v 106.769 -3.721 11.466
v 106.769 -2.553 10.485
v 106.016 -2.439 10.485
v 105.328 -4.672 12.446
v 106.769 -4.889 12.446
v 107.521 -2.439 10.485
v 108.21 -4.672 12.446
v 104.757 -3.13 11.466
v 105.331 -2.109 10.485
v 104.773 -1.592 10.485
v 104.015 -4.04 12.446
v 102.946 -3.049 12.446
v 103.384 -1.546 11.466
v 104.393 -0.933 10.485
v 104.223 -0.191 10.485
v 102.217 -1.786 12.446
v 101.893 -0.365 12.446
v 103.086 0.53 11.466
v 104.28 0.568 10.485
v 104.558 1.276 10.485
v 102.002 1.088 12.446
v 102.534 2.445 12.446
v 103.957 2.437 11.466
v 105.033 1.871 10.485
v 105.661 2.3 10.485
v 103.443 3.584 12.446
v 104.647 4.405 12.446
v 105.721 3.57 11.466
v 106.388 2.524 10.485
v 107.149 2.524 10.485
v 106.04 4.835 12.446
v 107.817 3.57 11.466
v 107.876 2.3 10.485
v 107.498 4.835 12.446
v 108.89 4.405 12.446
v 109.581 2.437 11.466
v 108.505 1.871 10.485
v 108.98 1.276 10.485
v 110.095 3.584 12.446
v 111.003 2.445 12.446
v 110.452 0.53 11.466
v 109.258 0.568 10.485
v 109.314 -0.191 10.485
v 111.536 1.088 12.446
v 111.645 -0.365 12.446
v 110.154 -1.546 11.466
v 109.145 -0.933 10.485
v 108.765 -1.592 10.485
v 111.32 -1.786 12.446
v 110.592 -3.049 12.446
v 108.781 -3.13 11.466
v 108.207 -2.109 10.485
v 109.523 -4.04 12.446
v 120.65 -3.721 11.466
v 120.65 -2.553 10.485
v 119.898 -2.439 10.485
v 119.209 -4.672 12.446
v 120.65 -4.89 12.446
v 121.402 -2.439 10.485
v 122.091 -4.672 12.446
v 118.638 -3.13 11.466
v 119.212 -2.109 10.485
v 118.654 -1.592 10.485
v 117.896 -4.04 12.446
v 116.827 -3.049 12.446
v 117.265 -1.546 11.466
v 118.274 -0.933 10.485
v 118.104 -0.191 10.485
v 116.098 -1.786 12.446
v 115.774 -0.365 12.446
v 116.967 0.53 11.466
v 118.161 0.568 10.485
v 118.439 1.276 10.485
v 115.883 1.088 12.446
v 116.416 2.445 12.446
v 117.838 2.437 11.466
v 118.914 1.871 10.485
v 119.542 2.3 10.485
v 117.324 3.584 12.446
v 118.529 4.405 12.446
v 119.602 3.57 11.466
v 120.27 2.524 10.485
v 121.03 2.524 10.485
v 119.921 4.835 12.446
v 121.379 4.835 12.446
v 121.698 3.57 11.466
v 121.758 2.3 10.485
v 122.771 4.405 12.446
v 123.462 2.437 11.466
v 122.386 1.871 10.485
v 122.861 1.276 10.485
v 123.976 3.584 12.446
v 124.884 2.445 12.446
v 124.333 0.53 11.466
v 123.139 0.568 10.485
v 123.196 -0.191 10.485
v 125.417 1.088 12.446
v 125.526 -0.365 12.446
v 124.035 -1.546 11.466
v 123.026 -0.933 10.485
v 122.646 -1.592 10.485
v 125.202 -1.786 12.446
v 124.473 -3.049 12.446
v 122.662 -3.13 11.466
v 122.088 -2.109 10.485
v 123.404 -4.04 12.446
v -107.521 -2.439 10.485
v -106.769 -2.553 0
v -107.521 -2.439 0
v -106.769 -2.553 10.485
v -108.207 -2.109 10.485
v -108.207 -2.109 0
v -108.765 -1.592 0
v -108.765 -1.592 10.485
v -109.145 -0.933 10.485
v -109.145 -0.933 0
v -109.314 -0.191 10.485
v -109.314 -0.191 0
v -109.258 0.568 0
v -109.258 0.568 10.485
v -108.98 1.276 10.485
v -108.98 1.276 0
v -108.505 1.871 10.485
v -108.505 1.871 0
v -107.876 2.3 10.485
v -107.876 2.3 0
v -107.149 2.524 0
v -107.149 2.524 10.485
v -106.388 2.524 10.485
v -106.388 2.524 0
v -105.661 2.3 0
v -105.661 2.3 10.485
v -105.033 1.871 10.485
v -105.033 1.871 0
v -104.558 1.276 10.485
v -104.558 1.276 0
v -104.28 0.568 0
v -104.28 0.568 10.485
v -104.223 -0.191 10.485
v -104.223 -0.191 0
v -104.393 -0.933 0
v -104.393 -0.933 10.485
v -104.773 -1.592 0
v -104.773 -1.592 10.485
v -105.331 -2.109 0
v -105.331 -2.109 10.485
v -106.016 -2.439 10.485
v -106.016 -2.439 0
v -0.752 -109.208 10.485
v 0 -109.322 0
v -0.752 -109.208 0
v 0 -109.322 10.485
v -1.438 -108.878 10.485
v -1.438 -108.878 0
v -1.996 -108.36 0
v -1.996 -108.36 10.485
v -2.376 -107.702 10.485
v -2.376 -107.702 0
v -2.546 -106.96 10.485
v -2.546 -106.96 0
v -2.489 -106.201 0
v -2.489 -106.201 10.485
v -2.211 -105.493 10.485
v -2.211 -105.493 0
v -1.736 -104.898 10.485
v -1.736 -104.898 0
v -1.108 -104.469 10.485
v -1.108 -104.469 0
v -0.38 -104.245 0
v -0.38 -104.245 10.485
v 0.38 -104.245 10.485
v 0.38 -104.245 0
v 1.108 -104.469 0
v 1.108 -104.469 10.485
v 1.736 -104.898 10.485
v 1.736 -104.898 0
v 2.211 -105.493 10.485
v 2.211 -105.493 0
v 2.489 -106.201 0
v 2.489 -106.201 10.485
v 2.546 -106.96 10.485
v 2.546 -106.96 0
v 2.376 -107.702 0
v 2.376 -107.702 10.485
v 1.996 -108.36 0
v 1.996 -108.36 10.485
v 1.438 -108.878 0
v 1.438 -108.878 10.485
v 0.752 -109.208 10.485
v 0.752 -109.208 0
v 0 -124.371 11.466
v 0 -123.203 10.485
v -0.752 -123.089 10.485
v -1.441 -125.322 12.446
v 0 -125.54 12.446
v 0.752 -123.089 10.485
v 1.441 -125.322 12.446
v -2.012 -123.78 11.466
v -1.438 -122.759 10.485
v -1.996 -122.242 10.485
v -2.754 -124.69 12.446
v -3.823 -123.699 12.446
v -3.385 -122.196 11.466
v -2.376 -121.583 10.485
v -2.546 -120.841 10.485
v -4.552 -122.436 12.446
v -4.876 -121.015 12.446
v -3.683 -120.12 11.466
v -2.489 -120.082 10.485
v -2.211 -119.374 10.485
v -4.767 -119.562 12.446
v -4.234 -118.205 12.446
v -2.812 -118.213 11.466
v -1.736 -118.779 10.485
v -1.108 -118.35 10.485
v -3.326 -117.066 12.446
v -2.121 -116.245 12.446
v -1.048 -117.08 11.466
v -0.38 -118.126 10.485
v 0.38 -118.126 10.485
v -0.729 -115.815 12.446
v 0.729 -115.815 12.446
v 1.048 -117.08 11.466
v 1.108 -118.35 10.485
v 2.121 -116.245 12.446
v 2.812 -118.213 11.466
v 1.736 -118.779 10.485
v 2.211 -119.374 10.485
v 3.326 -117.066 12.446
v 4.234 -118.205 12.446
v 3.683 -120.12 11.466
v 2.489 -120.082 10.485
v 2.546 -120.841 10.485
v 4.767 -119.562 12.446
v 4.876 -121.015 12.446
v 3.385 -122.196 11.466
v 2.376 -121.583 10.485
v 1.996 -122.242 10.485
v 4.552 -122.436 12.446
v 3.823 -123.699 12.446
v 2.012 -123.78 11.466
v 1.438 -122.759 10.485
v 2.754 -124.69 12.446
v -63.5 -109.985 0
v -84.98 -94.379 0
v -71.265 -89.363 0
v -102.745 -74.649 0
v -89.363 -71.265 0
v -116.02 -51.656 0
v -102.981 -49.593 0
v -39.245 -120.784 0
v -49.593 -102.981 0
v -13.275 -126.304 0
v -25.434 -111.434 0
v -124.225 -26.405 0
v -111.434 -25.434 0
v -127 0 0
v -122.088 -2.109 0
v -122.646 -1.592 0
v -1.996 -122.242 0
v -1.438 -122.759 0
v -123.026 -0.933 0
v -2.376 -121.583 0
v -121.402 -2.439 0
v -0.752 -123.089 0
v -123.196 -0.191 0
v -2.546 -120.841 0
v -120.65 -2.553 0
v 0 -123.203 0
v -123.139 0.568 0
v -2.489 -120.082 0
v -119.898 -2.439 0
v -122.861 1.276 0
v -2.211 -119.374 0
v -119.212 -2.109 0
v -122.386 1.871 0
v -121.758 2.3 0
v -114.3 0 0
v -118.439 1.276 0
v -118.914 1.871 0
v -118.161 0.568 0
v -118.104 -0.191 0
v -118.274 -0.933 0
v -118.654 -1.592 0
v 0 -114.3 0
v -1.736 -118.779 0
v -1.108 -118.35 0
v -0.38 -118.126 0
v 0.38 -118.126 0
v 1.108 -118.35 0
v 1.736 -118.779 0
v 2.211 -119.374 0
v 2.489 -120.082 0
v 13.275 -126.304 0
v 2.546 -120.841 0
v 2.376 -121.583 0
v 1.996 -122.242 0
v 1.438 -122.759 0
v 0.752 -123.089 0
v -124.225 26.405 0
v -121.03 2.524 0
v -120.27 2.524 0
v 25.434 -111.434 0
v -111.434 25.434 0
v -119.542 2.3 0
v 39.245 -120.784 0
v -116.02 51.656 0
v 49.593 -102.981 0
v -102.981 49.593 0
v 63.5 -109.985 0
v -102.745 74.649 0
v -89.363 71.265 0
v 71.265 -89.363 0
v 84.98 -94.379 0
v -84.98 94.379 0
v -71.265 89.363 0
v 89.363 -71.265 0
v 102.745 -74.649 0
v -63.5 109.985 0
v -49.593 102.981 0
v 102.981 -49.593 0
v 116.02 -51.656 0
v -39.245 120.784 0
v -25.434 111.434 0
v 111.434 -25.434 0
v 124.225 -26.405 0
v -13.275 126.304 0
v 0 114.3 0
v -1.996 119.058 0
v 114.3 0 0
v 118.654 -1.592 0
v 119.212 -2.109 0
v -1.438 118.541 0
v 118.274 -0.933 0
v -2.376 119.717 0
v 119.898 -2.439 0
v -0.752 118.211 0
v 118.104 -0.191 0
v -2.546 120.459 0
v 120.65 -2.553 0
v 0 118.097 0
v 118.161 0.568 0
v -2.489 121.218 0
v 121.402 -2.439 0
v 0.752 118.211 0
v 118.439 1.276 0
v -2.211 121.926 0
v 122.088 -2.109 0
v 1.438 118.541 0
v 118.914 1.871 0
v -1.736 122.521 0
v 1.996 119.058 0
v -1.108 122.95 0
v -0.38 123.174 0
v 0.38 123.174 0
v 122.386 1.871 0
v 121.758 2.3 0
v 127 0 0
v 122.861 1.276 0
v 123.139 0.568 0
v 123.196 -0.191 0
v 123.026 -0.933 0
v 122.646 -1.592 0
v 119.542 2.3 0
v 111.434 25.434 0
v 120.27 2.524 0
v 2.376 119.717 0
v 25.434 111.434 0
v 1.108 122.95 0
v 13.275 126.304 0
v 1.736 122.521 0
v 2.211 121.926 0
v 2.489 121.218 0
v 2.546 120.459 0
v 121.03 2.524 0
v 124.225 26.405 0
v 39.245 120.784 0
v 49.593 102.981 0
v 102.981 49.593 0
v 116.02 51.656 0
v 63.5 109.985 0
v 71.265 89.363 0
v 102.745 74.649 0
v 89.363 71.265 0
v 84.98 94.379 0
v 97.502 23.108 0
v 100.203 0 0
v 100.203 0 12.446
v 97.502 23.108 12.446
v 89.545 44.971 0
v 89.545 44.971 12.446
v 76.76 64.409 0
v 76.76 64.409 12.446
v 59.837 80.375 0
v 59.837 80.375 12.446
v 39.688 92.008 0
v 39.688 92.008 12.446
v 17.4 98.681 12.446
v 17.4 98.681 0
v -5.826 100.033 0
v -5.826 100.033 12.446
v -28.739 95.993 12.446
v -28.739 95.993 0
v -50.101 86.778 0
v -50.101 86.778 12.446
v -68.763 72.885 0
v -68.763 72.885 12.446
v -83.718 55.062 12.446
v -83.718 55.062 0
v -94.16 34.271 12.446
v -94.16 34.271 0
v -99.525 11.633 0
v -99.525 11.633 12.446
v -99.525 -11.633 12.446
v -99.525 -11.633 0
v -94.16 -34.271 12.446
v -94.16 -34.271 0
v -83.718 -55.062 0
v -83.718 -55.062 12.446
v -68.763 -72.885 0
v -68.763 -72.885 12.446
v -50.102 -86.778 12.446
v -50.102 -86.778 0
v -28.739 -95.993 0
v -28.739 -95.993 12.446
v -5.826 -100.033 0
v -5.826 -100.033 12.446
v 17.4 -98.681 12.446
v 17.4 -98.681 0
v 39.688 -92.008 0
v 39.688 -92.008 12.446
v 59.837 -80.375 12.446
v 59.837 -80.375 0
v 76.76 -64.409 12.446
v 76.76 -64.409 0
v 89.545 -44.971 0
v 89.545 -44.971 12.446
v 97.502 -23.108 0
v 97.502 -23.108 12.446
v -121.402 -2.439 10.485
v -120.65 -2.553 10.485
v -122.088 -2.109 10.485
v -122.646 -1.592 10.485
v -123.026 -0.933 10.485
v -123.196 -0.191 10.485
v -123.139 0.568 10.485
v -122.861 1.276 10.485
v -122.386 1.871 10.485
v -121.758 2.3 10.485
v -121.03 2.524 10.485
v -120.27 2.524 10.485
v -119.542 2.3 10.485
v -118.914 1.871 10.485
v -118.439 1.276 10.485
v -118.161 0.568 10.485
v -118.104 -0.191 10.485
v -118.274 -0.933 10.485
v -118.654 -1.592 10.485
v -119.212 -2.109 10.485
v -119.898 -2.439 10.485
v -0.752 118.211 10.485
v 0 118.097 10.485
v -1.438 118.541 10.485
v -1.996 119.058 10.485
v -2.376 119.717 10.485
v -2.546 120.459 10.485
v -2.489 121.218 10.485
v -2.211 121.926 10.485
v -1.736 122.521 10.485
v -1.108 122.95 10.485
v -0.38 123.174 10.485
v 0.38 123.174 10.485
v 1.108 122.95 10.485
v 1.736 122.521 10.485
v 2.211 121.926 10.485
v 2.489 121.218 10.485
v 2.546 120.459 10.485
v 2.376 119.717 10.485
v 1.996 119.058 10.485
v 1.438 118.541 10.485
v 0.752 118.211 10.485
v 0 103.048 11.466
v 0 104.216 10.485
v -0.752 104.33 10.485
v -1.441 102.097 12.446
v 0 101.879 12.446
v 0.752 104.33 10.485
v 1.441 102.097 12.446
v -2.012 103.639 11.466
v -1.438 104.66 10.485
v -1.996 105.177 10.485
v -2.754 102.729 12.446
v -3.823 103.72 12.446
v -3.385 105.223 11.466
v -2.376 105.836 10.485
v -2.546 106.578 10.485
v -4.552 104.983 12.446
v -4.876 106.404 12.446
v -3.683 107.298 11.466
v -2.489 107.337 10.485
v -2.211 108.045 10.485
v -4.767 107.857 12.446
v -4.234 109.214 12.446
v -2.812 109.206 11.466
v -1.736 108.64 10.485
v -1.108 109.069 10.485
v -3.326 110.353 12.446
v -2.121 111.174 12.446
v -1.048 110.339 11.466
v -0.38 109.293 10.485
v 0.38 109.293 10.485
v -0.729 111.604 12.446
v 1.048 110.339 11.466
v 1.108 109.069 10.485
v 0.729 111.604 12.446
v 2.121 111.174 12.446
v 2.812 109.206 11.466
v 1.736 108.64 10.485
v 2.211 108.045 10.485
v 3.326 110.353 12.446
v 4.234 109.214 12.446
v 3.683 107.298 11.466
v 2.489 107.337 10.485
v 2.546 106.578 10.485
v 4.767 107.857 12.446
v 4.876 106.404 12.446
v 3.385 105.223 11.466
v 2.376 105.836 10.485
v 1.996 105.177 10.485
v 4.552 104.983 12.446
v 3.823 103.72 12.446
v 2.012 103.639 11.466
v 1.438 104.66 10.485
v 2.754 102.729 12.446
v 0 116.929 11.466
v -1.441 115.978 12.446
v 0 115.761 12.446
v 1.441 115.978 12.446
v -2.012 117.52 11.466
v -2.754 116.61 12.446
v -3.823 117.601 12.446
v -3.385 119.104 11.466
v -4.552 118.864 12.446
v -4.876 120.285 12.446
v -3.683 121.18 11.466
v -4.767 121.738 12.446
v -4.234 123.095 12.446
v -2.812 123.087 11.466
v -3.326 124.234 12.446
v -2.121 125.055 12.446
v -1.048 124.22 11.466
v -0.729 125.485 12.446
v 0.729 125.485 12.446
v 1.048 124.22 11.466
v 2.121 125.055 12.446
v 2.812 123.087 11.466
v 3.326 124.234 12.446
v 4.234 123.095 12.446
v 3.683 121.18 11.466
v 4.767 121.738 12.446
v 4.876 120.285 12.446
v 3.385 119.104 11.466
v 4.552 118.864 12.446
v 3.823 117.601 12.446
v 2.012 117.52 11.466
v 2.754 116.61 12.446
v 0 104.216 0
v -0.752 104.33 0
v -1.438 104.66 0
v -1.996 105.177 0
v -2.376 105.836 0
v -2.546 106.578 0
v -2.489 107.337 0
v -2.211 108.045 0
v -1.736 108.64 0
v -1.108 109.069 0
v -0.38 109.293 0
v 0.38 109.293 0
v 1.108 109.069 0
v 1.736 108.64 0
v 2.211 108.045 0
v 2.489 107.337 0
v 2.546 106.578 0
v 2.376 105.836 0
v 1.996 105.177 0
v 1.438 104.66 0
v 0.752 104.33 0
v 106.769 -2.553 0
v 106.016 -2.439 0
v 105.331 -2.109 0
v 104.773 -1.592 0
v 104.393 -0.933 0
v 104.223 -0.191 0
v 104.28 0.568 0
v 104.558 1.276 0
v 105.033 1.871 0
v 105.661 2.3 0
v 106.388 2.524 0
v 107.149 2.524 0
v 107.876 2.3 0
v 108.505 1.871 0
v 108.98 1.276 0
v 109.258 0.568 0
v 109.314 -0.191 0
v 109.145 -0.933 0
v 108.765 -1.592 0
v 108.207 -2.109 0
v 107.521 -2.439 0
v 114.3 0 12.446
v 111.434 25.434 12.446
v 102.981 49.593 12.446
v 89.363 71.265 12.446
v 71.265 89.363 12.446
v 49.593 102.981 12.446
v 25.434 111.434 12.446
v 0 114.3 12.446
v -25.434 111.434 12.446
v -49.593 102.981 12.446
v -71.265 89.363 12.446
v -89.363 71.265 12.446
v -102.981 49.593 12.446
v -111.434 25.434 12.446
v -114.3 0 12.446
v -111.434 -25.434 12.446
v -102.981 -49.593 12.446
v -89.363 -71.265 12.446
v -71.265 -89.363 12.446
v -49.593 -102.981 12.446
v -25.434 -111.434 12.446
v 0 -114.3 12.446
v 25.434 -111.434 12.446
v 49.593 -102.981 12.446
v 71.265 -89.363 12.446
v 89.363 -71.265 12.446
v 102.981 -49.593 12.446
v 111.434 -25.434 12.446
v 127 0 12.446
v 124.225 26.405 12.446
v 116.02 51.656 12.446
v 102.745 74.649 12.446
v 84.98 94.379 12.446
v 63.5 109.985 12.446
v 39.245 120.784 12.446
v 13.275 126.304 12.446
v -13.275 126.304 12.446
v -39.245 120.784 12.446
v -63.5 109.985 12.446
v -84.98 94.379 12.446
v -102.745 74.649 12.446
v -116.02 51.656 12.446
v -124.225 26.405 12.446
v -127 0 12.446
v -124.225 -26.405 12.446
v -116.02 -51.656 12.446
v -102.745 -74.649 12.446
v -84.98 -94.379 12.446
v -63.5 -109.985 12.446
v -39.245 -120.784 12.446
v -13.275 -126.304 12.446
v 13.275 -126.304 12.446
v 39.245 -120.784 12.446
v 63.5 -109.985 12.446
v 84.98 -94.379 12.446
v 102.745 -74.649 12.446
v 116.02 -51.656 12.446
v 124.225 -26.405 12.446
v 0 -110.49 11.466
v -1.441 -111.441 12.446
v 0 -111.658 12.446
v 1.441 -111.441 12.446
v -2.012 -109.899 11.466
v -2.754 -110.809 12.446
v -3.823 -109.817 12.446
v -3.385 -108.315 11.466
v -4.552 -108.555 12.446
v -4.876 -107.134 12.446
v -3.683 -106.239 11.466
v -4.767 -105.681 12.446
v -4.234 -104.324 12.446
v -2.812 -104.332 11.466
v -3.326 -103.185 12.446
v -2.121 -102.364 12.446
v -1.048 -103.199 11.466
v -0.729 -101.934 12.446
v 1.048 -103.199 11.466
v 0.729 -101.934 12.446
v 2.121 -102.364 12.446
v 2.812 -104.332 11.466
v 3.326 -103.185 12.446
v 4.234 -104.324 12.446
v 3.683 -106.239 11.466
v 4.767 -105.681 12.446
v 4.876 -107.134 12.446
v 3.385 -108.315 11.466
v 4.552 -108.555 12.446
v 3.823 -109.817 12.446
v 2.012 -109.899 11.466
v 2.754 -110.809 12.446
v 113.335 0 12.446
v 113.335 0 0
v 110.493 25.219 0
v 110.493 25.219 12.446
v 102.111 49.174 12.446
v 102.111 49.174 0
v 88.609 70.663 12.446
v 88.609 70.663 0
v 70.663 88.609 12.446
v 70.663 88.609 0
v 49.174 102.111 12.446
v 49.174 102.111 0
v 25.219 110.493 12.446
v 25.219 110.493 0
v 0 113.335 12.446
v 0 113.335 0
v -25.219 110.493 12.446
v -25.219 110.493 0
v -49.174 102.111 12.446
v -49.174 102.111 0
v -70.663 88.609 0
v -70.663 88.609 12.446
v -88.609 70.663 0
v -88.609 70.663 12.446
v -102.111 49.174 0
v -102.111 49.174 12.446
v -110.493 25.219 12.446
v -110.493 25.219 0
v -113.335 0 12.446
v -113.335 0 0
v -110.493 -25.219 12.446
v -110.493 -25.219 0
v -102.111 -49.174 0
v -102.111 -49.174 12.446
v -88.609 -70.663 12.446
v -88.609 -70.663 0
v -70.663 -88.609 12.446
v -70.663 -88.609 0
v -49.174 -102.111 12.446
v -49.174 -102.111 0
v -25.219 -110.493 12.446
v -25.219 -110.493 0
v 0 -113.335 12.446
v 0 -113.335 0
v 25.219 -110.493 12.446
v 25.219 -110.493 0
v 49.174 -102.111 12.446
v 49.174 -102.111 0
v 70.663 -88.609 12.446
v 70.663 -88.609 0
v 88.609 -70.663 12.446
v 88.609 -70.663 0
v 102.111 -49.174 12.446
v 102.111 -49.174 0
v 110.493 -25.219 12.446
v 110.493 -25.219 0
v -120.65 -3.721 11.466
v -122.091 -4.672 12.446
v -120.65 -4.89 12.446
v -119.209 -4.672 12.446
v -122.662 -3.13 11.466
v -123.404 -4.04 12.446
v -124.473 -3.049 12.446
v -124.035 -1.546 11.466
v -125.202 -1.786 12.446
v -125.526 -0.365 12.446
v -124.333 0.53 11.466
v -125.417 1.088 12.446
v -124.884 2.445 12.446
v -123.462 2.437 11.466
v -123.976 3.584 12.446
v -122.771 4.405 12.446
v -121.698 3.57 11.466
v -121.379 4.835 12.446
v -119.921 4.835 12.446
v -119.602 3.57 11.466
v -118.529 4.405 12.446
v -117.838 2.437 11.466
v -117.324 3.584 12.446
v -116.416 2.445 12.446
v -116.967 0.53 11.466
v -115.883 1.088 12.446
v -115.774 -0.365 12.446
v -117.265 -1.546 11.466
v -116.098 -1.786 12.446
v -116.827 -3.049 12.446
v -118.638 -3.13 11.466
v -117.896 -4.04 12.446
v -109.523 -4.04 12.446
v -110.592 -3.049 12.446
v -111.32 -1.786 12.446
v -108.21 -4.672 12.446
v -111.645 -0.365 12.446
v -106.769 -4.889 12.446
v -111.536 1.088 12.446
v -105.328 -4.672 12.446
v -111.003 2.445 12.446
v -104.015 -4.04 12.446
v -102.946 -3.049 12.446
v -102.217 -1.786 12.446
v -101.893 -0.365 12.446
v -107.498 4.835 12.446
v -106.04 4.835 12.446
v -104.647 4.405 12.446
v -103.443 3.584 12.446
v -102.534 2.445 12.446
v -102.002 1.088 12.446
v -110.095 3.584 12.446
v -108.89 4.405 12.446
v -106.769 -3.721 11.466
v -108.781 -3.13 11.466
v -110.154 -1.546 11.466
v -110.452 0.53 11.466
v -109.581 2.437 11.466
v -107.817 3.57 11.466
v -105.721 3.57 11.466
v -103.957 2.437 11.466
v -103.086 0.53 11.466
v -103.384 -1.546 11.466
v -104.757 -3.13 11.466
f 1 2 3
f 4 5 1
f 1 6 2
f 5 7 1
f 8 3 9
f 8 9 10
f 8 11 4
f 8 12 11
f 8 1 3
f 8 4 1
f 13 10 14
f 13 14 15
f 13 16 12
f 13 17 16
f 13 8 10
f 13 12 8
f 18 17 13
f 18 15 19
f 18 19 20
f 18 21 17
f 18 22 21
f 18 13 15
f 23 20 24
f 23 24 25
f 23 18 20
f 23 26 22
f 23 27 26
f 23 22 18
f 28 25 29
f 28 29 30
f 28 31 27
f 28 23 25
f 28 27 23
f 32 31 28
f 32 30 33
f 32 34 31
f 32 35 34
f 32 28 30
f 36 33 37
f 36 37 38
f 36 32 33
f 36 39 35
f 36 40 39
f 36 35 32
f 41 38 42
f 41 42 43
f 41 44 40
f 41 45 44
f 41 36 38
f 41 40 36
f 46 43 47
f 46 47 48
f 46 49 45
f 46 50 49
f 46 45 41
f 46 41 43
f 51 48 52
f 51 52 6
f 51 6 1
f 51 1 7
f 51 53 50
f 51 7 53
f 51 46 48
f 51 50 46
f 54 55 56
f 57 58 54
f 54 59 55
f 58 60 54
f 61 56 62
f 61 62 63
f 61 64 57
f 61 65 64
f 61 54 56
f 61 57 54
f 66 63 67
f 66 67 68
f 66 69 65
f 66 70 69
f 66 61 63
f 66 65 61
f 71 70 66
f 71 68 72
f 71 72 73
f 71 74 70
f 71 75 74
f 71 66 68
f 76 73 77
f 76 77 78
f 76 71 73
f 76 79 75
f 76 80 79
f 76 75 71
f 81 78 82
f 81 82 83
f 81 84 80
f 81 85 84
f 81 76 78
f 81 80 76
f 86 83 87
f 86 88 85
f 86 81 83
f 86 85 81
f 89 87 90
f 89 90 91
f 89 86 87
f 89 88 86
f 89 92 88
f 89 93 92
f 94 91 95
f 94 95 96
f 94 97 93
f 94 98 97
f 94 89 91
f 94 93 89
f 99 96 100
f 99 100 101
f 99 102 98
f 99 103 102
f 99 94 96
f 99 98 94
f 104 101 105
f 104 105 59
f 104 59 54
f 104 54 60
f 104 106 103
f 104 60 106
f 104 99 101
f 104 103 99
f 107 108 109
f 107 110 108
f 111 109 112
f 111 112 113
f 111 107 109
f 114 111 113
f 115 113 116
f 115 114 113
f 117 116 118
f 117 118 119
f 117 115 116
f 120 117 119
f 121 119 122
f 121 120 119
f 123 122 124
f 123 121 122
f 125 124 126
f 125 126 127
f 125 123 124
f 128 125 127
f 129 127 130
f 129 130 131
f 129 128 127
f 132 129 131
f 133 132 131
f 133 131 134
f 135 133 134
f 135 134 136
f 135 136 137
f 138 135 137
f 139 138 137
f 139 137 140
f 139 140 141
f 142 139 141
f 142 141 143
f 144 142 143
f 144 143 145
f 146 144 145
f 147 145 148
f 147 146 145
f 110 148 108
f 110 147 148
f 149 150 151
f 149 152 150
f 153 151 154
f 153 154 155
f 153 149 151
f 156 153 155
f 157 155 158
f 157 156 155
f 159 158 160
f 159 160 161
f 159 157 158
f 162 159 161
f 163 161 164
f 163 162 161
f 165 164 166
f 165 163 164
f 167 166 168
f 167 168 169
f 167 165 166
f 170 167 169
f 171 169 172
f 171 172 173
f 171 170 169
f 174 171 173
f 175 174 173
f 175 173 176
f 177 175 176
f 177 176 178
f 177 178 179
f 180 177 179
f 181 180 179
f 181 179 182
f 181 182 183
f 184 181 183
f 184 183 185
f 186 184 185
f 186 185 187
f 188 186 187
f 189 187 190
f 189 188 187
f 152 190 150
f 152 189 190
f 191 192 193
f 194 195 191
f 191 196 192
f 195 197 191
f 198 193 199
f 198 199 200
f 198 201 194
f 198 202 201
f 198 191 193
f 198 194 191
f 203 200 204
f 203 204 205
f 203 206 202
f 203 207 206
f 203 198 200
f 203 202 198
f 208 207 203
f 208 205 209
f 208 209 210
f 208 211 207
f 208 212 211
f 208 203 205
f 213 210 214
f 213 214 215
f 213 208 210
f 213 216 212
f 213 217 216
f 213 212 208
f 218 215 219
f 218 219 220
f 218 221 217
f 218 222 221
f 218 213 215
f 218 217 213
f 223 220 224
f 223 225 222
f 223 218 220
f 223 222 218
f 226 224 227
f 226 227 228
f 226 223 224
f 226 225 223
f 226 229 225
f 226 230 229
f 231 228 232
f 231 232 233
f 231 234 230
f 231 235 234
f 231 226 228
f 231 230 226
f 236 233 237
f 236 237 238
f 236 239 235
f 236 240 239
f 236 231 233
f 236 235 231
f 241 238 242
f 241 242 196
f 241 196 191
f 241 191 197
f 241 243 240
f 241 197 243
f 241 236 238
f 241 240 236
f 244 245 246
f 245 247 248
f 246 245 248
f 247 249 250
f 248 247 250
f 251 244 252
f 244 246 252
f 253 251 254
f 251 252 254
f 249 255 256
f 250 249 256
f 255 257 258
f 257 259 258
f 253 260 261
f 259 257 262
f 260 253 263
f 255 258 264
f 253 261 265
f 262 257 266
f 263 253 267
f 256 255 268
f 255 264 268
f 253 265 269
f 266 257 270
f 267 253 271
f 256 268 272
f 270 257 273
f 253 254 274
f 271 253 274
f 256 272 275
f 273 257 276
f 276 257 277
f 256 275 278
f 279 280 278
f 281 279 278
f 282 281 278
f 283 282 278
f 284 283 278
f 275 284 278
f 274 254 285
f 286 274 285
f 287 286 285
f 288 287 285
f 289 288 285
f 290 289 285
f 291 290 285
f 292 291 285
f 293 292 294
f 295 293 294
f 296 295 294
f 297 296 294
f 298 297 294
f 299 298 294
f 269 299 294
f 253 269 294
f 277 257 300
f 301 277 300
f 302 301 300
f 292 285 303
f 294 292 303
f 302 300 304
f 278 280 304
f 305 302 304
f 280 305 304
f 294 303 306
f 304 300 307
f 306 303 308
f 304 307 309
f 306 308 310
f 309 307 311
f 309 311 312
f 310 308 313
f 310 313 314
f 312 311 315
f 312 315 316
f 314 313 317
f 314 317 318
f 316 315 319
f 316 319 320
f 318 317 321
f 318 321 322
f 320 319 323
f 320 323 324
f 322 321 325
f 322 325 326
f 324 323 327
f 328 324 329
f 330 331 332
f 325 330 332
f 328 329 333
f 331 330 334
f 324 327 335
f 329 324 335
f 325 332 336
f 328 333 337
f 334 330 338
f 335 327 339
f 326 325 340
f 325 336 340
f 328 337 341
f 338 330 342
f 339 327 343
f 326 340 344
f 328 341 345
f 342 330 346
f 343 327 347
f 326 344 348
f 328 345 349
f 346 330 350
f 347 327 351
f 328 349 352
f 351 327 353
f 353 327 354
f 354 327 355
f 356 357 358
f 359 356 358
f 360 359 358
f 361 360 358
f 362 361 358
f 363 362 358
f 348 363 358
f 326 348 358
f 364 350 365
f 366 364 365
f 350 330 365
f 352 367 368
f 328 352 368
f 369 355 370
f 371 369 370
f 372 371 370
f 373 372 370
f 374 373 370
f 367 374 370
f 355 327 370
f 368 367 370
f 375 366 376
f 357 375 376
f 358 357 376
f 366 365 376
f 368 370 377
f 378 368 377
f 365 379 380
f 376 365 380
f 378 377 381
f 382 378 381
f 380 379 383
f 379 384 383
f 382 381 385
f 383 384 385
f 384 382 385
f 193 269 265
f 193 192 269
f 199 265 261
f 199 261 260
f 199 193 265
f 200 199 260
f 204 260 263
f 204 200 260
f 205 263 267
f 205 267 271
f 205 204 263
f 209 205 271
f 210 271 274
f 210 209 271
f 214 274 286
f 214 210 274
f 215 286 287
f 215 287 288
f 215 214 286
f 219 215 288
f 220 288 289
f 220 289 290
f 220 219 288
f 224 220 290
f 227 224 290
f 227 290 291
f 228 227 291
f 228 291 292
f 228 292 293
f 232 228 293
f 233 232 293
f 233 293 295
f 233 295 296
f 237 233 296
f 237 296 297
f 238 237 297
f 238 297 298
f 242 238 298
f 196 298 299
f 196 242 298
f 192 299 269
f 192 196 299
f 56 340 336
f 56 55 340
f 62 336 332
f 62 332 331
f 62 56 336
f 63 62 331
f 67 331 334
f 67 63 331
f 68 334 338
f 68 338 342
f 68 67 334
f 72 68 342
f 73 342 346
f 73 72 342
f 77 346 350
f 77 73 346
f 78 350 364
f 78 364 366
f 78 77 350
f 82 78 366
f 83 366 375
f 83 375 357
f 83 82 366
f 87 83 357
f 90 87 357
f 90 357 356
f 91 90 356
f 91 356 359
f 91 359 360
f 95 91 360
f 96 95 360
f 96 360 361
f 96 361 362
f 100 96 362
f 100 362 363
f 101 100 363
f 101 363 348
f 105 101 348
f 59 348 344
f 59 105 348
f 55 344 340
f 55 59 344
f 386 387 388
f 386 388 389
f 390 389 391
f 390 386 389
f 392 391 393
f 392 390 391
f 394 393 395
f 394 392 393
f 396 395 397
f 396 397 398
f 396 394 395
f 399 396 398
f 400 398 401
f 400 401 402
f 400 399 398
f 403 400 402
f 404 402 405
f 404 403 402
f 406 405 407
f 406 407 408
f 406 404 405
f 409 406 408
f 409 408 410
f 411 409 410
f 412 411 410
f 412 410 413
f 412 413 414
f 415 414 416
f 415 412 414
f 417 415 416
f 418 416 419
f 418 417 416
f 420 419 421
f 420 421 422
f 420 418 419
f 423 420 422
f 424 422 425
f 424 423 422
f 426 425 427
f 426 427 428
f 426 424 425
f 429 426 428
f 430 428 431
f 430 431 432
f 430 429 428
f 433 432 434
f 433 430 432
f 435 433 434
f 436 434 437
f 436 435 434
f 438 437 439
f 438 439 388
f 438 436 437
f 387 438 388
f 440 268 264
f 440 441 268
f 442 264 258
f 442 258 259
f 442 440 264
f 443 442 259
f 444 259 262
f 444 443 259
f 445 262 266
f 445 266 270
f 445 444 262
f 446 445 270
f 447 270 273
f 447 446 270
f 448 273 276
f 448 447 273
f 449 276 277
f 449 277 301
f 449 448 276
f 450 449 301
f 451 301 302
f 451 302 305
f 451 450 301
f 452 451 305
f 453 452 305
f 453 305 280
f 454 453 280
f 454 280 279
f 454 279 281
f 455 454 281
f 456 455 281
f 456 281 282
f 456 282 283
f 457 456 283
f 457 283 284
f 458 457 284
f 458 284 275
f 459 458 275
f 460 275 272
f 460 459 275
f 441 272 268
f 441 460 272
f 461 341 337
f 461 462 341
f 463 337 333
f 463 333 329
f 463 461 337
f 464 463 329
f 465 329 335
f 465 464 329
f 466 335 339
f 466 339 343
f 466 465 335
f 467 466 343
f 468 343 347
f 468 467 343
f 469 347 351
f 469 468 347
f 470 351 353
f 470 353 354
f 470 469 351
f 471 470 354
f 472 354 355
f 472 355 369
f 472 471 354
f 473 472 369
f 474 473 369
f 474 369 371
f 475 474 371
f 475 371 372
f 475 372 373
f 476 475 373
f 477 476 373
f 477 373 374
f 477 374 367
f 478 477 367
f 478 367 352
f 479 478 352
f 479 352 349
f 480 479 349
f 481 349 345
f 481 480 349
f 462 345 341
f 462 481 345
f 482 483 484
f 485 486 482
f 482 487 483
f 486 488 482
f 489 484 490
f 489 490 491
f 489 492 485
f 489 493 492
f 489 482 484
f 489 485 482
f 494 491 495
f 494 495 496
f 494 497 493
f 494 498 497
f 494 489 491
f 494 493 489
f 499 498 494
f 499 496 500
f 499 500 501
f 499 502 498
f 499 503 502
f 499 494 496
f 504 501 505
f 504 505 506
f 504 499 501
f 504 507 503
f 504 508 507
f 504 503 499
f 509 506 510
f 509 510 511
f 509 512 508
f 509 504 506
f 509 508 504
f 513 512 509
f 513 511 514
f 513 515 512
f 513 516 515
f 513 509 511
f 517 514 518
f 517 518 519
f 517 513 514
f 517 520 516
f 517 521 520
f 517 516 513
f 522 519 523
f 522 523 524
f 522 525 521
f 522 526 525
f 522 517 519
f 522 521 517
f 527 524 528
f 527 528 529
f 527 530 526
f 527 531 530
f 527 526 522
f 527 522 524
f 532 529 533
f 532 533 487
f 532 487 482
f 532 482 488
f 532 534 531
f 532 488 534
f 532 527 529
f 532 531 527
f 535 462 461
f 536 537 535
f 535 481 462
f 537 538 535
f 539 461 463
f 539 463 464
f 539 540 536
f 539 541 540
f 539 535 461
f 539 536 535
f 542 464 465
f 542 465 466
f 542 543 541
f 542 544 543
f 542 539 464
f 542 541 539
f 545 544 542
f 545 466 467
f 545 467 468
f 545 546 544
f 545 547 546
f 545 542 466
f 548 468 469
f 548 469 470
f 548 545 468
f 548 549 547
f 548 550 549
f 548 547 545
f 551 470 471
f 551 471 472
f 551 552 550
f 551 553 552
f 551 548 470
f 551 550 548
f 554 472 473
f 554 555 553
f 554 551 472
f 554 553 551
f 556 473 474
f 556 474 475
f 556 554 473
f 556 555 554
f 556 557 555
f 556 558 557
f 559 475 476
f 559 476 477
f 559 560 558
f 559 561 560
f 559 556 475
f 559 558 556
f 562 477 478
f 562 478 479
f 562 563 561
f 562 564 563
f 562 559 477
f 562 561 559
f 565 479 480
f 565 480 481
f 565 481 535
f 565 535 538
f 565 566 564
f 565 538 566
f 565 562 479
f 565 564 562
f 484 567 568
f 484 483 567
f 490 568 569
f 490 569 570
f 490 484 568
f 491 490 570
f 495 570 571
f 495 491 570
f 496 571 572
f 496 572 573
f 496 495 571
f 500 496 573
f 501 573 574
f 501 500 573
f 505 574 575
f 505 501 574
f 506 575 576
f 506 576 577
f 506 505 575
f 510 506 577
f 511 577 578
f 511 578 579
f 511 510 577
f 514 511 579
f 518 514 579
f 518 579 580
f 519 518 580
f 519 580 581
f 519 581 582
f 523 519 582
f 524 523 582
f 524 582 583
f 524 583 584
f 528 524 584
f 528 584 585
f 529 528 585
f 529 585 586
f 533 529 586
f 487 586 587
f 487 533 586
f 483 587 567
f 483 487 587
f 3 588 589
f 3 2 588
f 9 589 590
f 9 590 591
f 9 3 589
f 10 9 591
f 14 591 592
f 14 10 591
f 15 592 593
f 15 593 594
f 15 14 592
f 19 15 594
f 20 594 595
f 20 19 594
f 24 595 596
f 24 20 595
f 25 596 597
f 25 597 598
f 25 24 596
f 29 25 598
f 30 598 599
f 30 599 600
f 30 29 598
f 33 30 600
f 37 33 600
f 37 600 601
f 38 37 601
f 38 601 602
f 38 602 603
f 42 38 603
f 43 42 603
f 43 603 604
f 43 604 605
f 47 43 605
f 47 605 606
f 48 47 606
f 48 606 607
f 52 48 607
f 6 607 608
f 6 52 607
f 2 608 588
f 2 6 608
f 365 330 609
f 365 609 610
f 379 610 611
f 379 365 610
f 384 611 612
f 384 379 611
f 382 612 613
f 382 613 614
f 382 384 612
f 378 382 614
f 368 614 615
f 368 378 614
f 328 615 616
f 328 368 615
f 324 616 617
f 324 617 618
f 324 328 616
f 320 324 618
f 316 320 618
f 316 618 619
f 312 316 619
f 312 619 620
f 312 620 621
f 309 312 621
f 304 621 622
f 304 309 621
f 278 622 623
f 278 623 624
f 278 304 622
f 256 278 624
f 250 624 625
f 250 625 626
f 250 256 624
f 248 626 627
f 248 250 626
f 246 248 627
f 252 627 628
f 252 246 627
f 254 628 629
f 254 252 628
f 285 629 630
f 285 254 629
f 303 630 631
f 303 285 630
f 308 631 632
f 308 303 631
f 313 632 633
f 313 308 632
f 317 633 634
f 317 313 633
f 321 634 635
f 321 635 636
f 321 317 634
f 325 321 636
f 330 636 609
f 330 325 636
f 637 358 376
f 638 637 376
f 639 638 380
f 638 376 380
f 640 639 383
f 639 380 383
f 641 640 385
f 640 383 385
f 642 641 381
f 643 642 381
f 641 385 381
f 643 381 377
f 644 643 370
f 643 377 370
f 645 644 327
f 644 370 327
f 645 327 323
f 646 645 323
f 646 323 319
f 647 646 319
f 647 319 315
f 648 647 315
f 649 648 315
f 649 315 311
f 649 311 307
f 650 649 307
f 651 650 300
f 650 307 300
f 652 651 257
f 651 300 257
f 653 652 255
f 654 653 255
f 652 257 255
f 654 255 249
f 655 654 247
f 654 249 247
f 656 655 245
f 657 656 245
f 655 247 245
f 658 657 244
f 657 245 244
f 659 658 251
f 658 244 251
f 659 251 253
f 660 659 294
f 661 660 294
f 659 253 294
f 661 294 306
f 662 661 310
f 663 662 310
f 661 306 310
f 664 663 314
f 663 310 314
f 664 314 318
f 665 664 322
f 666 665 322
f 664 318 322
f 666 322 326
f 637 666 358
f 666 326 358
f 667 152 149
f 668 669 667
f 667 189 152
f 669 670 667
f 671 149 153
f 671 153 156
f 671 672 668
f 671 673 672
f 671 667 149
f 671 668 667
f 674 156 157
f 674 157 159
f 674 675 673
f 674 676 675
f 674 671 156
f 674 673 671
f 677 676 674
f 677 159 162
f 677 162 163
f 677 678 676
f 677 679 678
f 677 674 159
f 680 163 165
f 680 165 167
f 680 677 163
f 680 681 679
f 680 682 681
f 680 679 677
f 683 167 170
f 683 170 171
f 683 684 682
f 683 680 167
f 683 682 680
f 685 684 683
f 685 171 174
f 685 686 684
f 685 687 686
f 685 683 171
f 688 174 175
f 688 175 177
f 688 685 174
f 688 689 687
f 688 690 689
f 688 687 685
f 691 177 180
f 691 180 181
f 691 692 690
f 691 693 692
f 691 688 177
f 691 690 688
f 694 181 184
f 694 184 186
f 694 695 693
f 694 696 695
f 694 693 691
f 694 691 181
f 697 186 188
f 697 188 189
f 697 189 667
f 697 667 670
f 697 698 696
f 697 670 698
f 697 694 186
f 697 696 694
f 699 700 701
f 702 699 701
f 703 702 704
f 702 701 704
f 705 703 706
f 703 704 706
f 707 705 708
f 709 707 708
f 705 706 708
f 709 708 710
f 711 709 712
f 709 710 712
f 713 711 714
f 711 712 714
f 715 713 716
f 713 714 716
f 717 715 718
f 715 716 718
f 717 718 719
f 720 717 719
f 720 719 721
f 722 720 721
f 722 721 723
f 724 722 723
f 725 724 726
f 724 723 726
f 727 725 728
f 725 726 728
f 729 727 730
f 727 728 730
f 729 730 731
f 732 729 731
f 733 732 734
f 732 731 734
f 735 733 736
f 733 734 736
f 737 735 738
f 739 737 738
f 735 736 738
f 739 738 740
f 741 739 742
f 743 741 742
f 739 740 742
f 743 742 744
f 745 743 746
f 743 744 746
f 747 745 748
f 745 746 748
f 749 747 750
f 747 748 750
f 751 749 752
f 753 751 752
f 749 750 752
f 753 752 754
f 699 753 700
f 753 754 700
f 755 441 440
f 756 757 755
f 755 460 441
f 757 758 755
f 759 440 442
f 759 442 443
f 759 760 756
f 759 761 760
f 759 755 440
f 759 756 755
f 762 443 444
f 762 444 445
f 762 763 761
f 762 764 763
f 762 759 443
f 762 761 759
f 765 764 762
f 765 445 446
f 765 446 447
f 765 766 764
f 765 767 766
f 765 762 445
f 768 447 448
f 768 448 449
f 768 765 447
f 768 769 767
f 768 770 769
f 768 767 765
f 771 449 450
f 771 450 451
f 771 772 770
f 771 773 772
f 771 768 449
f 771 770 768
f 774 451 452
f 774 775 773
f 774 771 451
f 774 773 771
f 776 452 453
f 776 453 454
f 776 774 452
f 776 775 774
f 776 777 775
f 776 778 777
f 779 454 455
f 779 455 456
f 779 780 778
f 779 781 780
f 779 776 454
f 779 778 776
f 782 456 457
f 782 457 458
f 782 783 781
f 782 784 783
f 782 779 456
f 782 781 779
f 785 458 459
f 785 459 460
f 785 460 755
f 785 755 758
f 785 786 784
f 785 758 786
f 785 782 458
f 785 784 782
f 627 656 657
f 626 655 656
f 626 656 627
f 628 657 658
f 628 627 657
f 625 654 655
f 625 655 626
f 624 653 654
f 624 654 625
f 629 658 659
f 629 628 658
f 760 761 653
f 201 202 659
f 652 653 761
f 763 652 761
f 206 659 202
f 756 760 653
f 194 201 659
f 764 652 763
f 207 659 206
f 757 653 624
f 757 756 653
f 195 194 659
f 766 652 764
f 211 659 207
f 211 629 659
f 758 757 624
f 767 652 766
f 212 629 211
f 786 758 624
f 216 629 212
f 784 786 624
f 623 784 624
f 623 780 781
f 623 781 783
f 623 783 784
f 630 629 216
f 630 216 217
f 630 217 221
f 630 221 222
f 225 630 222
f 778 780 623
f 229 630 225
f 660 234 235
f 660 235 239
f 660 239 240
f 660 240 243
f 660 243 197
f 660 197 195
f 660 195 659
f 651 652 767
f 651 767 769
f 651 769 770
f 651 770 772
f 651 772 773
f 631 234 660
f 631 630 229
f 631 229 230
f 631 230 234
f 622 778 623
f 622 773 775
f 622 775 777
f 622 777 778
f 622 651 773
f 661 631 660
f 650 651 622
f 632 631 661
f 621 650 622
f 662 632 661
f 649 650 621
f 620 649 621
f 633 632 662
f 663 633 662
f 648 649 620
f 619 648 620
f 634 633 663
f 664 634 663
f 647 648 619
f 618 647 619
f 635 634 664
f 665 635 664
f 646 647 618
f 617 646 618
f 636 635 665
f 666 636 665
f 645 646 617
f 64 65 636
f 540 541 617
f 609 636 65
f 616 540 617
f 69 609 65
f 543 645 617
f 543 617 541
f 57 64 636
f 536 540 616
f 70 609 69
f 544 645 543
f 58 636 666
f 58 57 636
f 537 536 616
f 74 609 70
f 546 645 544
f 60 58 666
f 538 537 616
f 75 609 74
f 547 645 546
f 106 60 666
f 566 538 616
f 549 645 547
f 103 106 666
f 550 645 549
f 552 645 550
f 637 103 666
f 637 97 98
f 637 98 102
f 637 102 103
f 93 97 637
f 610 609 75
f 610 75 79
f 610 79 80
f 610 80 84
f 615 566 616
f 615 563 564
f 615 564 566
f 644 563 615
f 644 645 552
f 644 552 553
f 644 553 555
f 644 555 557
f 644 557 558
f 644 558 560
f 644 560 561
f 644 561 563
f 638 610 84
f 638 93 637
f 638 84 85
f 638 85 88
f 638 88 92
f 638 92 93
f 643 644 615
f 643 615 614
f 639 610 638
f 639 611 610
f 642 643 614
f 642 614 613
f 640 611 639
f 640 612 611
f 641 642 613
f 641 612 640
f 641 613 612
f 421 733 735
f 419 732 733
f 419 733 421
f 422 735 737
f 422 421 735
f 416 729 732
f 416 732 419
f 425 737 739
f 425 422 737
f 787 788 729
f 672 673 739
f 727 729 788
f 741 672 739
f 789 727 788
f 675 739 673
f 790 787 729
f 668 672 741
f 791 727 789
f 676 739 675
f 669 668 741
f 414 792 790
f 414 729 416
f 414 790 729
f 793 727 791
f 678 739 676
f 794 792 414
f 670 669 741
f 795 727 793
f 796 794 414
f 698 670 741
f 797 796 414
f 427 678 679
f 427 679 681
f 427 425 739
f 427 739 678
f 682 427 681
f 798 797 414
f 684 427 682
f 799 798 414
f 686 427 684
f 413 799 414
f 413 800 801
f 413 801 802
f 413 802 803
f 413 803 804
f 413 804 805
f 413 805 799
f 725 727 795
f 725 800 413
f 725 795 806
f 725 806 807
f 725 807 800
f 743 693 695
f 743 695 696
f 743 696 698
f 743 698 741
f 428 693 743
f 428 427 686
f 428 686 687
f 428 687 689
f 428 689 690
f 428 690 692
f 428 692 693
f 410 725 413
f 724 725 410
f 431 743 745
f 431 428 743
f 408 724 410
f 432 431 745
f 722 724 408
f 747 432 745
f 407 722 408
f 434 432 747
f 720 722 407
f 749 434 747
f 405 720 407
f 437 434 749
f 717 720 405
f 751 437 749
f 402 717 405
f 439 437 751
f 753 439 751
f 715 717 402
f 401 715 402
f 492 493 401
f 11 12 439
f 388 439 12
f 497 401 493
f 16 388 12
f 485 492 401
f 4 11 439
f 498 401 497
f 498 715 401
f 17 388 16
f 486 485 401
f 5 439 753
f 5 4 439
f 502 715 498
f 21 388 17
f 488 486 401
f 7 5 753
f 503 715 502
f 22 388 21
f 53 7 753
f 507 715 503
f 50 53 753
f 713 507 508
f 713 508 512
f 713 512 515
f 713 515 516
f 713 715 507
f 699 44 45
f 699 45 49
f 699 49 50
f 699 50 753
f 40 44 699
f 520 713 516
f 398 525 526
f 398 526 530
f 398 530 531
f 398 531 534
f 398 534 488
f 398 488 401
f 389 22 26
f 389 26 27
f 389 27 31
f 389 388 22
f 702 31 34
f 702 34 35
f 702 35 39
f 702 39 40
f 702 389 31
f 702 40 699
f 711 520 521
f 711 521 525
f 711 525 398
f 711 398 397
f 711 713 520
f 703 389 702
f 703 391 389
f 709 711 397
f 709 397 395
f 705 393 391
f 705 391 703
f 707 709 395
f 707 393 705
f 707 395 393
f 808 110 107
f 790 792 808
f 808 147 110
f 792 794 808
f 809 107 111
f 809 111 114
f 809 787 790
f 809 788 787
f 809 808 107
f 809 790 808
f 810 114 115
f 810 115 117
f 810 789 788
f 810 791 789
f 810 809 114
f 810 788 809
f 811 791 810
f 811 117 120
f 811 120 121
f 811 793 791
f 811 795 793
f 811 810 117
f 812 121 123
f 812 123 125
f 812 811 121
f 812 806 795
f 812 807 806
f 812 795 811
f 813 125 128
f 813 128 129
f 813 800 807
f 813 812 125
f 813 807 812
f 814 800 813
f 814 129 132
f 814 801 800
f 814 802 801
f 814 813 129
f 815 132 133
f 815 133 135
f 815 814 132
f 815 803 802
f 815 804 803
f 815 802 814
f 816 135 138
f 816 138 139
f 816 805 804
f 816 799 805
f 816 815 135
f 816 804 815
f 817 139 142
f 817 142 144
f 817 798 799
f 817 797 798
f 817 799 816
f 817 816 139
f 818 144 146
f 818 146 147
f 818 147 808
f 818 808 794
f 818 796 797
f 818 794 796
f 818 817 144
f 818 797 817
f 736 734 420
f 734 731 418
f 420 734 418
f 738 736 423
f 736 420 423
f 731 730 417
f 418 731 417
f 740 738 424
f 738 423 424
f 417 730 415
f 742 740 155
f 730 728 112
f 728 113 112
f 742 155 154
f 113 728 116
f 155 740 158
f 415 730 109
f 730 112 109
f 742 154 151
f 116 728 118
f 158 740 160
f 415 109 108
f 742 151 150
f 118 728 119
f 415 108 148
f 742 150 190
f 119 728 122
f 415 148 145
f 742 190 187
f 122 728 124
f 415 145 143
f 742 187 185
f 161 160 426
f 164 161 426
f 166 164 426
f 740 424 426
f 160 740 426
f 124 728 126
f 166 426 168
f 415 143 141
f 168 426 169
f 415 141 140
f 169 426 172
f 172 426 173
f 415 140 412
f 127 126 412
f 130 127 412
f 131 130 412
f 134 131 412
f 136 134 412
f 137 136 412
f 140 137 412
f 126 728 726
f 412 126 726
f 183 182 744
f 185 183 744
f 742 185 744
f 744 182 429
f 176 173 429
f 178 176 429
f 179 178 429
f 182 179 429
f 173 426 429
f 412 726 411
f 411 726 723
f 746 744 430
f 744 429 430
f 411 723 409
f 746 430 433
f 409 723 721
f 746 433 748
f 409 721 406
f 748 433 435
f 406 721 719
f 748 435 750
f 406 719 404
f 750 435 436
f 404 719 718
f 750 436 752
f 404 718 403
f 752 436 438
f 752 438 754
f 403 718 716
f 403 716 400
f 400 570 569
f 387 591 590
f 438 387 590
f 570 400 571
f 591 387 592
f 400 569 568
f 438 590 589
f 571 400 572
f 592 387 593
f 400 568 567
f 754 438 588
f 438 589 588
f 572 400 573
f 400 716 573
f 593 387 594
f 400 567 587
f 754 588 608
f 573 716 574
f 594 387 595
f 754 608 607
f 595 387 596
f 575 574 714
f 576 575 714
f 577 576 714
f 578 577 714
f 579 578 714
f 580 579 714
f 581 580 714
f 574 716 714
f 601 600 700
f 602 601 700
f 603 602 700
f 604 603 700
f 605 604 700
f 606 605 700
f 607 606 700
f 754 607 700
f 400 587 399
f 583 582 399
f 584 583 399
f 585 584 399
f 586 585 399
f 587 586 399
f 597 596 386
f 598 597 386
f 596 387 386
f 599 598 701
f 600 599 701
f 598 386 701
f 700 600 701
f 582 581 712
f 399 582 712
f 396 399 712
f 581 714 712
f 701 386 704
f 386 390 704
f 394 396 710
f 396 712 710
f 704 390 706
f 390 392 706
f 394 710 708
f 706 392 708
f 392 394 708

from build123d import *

# Parameters (mm, degrees)
SKETCH1_R                                     = 113.3348
SKETCH1_R_2                                   = 100.203
BOSS_EXTRUDE1_DEPTH                           = 12.446
SKETCH1_R_3                                   = 127
SKETCH1_R_4                                   = 114.3
BOSS_EXTRUDE1_2_DEPTH                         = 12.446
CSK_FOR_10_FLAT_HEAD_MACHINE_SCREW_2_COUNT    = 2
CSK_FOR_10_FLAT_HEAD_MACHINE_SCREW_2_PITCH    = 170.6248663
CSK_FOR_10_FLAT_HEAD_MACHINE_SCREW_3_COUNT    = 2
CSK_FOR_10_FLAT_HEAD_MACHINE_SCREW_3_PITCH    = 241.3
CSK_FOR_10_FLAT_HEAD_MACHINE_SCREW_4_COUNT    = 2
CSK_FOR_10_FLAT_HEAD_MACHINE_SCREW_4_PITCH    = 170.6248663
CSK_FOR_10_FLAT_HEAD_MACHINE_SCREW_5_AT_COUNT = 2
CSK_FOR_10_FLAT_HEAD_MACHINE_SCREW_5_AT_PITCH = 150.99402642
CSK_FOR_10_FLAT_HEAD_MACHINE_SCREW_6_COUNT    = 2
CSK_FOR_10_FLAT_HEAD_MACHINE_SCREW_6_PITCH    = 213.5378
CSK_FOR_10_FLAT_HEAD_MACHINE_SCREW_7_COUNT    = 2
CSK_FOR_10_FLAT_HEAD_MACHINE_SCREW_7_PITCH    = 150.99402642


with BuildPart() as part:
    # Sketch1 → Boss-Extrude1 (new body)
    with BuildSketch(Plane.XY):
        Circle(SKETCH1_R)
        Circle(SKETCH1_R_2, mode=Mode.SUBTRACT)
    extrude(amount=BOSS_EXTRUDE1_DEPTH)

    # Sketch15 → CSK for _10 Flat Head Machine Screw  5 (revolve, cut)
    with BuildSketch(Plane(origin=(0, -106.7689, 12.446), x_dir=(0, -1, 0), z_dir=(1, 0, 0))):
        Polygon((0, 0), (0, 12.446), (2.5527, 12.446), (2.5527, 1.960808018), (4.8895, 0), align=None)
    csk_for_10_flat_head_machine_screw_5 = revolve(axis=Axis((0, -106.7689, 18.796), (0, 0, -1)), mode=Mode.SUBTRACT)

    # CSK for _10 Flat Head Machine Screw 5 at: CSK for _10 Flat Head Machine Screw  5 ×2
    with Locations(*[Vector(-0.7071067811865476, 0.7071067811865476, 0) * (i * CSK_FOR_10_FLAT_HEAD_MACHINE_SCREW_5_AT_PITCH) for i in range(1, CSK_FOR_10_FLAT_HEAD_MACHINE_SCREW_5_AT_COUNT)]):
        add(csk_for_10_flat_head_machine_screw_5, mode=Mode.SUBTRACT)

    # CSK for _10 Flat Head Machine Screw  6: CSK for _10 Flat Head Machine Screw  5 ×2
    with Locations(*[(0, i * CSK_FOR_10_FLAT_HEAD_MACHINE_SCREW_6_PITCH, 0) for i in range(1, CSK_FOR_10_FLAT_HEAD_MACHINE_SCREW_6_COUNT)]):
        add(csk_for_10_flat_head_machine_screw_5, mode=Mode.SUBTRACT)

    # CSK for _10 Flat Head Machine Screw  7: CSK for _10 Flat Head Machine Screw  5 ×2
    with Locations(*[Vector(0.7071067811865476, 0.7071067811865476, 0) * (i * CSK_FOR_10_FLAT_HEAD_MACHINE_SCREW_7_PITCH) for i in range(1, CSK_FOR_10_FLAT_HEAD_MACHINE_SCREW_7_COUNT)]):
        add(csk_for_10_flat_head_machine_screw_5, mode=Mode.SUBTRACT)


with BuildPart() as body_2:
    # Sketch1 → Boss-Extrude1 2 (new body)
    with BuildSketch(Plane.XY):
        Circle(SKETCH1_R_3)
        Circle(SKETCH1_R_4, mode=Mode.SUBTRACT)
    extrude(amount=BOSS_EXTRUDE1_2_DEPTH)

    # Sketch11 → CSK for _10 Flat Head Machine Screw _100 (revolve, cut)
    with BuildSketch(Plane(origin=(0, -120.65, 12.446), x_dir=(0, -1, 0), z_dir=(1, 0, 0))):
        Polygon((0, 0), (0, 12.446), (2.5527, 12.446), (2.5527, 1.960808018), (4.8895, 0), align=None)
    csk_for_10_flat_head_machine_screw_100 = revolve(axis=Axis((0, -120.65, 18.796), (0, 0, -1)), mode=Mode.SUBTRACT)

    # CSK for _10 Flat Head Machine Screw  2: CSK for _10 Flat Head Machine Screw _100 ×2
    with Locations(*[Vector(-0.7071067811865476, 0.7071067811865476, 0) * (i * CSK_FOR_10_FLAT_HEAD_MACHINE_SCREW_2_PITCH) for i in range(1, CSK_FOR_10_FLAT_HEAD_MACHINE_SCREW_2_COUNT)]):
        add(csk_for_10_flat_head_machine_screw_100, mode=Mode.SUBTRACT)

    # CSK for _10 Flat Head Machine Screw  3: CSK for _10 Flat Head Machine Screw _100 ×2
    with Locations(*[(0, i * CSK_FOR_10_FLAT_HEAD_MACHINE_SCREW_3_PITCH, 0) for i in range(1, CSK_FOR_10_FLAT_HEAD_MACHINE_SCREW_3_COUNT)]):
        add(csk_for_10_flat_head_machine_screw_100, mode=Mode.SUBTRACT)

    # CSK for _10 Flat Head Machine Screw  4: CSK for _10 Flat Head Machine Screw _100 ×2
    with Locations(*[Vector(0.7071067811865476, 0.7071067811865476, 0) * (i * CSK_FOR_10_FLAT_HEAD_MACHINE_SCREW_4_PITCH) for i in range(1, CSK_FOR_10_FLAT_HEAD_MACHINE_SCREW_4_COUNT)]):
        add(csk_for_10_flat_head_machine_screw_100, mode=Mode.SUBTRACT)


solid = Compound([part.part, body_2.part])
